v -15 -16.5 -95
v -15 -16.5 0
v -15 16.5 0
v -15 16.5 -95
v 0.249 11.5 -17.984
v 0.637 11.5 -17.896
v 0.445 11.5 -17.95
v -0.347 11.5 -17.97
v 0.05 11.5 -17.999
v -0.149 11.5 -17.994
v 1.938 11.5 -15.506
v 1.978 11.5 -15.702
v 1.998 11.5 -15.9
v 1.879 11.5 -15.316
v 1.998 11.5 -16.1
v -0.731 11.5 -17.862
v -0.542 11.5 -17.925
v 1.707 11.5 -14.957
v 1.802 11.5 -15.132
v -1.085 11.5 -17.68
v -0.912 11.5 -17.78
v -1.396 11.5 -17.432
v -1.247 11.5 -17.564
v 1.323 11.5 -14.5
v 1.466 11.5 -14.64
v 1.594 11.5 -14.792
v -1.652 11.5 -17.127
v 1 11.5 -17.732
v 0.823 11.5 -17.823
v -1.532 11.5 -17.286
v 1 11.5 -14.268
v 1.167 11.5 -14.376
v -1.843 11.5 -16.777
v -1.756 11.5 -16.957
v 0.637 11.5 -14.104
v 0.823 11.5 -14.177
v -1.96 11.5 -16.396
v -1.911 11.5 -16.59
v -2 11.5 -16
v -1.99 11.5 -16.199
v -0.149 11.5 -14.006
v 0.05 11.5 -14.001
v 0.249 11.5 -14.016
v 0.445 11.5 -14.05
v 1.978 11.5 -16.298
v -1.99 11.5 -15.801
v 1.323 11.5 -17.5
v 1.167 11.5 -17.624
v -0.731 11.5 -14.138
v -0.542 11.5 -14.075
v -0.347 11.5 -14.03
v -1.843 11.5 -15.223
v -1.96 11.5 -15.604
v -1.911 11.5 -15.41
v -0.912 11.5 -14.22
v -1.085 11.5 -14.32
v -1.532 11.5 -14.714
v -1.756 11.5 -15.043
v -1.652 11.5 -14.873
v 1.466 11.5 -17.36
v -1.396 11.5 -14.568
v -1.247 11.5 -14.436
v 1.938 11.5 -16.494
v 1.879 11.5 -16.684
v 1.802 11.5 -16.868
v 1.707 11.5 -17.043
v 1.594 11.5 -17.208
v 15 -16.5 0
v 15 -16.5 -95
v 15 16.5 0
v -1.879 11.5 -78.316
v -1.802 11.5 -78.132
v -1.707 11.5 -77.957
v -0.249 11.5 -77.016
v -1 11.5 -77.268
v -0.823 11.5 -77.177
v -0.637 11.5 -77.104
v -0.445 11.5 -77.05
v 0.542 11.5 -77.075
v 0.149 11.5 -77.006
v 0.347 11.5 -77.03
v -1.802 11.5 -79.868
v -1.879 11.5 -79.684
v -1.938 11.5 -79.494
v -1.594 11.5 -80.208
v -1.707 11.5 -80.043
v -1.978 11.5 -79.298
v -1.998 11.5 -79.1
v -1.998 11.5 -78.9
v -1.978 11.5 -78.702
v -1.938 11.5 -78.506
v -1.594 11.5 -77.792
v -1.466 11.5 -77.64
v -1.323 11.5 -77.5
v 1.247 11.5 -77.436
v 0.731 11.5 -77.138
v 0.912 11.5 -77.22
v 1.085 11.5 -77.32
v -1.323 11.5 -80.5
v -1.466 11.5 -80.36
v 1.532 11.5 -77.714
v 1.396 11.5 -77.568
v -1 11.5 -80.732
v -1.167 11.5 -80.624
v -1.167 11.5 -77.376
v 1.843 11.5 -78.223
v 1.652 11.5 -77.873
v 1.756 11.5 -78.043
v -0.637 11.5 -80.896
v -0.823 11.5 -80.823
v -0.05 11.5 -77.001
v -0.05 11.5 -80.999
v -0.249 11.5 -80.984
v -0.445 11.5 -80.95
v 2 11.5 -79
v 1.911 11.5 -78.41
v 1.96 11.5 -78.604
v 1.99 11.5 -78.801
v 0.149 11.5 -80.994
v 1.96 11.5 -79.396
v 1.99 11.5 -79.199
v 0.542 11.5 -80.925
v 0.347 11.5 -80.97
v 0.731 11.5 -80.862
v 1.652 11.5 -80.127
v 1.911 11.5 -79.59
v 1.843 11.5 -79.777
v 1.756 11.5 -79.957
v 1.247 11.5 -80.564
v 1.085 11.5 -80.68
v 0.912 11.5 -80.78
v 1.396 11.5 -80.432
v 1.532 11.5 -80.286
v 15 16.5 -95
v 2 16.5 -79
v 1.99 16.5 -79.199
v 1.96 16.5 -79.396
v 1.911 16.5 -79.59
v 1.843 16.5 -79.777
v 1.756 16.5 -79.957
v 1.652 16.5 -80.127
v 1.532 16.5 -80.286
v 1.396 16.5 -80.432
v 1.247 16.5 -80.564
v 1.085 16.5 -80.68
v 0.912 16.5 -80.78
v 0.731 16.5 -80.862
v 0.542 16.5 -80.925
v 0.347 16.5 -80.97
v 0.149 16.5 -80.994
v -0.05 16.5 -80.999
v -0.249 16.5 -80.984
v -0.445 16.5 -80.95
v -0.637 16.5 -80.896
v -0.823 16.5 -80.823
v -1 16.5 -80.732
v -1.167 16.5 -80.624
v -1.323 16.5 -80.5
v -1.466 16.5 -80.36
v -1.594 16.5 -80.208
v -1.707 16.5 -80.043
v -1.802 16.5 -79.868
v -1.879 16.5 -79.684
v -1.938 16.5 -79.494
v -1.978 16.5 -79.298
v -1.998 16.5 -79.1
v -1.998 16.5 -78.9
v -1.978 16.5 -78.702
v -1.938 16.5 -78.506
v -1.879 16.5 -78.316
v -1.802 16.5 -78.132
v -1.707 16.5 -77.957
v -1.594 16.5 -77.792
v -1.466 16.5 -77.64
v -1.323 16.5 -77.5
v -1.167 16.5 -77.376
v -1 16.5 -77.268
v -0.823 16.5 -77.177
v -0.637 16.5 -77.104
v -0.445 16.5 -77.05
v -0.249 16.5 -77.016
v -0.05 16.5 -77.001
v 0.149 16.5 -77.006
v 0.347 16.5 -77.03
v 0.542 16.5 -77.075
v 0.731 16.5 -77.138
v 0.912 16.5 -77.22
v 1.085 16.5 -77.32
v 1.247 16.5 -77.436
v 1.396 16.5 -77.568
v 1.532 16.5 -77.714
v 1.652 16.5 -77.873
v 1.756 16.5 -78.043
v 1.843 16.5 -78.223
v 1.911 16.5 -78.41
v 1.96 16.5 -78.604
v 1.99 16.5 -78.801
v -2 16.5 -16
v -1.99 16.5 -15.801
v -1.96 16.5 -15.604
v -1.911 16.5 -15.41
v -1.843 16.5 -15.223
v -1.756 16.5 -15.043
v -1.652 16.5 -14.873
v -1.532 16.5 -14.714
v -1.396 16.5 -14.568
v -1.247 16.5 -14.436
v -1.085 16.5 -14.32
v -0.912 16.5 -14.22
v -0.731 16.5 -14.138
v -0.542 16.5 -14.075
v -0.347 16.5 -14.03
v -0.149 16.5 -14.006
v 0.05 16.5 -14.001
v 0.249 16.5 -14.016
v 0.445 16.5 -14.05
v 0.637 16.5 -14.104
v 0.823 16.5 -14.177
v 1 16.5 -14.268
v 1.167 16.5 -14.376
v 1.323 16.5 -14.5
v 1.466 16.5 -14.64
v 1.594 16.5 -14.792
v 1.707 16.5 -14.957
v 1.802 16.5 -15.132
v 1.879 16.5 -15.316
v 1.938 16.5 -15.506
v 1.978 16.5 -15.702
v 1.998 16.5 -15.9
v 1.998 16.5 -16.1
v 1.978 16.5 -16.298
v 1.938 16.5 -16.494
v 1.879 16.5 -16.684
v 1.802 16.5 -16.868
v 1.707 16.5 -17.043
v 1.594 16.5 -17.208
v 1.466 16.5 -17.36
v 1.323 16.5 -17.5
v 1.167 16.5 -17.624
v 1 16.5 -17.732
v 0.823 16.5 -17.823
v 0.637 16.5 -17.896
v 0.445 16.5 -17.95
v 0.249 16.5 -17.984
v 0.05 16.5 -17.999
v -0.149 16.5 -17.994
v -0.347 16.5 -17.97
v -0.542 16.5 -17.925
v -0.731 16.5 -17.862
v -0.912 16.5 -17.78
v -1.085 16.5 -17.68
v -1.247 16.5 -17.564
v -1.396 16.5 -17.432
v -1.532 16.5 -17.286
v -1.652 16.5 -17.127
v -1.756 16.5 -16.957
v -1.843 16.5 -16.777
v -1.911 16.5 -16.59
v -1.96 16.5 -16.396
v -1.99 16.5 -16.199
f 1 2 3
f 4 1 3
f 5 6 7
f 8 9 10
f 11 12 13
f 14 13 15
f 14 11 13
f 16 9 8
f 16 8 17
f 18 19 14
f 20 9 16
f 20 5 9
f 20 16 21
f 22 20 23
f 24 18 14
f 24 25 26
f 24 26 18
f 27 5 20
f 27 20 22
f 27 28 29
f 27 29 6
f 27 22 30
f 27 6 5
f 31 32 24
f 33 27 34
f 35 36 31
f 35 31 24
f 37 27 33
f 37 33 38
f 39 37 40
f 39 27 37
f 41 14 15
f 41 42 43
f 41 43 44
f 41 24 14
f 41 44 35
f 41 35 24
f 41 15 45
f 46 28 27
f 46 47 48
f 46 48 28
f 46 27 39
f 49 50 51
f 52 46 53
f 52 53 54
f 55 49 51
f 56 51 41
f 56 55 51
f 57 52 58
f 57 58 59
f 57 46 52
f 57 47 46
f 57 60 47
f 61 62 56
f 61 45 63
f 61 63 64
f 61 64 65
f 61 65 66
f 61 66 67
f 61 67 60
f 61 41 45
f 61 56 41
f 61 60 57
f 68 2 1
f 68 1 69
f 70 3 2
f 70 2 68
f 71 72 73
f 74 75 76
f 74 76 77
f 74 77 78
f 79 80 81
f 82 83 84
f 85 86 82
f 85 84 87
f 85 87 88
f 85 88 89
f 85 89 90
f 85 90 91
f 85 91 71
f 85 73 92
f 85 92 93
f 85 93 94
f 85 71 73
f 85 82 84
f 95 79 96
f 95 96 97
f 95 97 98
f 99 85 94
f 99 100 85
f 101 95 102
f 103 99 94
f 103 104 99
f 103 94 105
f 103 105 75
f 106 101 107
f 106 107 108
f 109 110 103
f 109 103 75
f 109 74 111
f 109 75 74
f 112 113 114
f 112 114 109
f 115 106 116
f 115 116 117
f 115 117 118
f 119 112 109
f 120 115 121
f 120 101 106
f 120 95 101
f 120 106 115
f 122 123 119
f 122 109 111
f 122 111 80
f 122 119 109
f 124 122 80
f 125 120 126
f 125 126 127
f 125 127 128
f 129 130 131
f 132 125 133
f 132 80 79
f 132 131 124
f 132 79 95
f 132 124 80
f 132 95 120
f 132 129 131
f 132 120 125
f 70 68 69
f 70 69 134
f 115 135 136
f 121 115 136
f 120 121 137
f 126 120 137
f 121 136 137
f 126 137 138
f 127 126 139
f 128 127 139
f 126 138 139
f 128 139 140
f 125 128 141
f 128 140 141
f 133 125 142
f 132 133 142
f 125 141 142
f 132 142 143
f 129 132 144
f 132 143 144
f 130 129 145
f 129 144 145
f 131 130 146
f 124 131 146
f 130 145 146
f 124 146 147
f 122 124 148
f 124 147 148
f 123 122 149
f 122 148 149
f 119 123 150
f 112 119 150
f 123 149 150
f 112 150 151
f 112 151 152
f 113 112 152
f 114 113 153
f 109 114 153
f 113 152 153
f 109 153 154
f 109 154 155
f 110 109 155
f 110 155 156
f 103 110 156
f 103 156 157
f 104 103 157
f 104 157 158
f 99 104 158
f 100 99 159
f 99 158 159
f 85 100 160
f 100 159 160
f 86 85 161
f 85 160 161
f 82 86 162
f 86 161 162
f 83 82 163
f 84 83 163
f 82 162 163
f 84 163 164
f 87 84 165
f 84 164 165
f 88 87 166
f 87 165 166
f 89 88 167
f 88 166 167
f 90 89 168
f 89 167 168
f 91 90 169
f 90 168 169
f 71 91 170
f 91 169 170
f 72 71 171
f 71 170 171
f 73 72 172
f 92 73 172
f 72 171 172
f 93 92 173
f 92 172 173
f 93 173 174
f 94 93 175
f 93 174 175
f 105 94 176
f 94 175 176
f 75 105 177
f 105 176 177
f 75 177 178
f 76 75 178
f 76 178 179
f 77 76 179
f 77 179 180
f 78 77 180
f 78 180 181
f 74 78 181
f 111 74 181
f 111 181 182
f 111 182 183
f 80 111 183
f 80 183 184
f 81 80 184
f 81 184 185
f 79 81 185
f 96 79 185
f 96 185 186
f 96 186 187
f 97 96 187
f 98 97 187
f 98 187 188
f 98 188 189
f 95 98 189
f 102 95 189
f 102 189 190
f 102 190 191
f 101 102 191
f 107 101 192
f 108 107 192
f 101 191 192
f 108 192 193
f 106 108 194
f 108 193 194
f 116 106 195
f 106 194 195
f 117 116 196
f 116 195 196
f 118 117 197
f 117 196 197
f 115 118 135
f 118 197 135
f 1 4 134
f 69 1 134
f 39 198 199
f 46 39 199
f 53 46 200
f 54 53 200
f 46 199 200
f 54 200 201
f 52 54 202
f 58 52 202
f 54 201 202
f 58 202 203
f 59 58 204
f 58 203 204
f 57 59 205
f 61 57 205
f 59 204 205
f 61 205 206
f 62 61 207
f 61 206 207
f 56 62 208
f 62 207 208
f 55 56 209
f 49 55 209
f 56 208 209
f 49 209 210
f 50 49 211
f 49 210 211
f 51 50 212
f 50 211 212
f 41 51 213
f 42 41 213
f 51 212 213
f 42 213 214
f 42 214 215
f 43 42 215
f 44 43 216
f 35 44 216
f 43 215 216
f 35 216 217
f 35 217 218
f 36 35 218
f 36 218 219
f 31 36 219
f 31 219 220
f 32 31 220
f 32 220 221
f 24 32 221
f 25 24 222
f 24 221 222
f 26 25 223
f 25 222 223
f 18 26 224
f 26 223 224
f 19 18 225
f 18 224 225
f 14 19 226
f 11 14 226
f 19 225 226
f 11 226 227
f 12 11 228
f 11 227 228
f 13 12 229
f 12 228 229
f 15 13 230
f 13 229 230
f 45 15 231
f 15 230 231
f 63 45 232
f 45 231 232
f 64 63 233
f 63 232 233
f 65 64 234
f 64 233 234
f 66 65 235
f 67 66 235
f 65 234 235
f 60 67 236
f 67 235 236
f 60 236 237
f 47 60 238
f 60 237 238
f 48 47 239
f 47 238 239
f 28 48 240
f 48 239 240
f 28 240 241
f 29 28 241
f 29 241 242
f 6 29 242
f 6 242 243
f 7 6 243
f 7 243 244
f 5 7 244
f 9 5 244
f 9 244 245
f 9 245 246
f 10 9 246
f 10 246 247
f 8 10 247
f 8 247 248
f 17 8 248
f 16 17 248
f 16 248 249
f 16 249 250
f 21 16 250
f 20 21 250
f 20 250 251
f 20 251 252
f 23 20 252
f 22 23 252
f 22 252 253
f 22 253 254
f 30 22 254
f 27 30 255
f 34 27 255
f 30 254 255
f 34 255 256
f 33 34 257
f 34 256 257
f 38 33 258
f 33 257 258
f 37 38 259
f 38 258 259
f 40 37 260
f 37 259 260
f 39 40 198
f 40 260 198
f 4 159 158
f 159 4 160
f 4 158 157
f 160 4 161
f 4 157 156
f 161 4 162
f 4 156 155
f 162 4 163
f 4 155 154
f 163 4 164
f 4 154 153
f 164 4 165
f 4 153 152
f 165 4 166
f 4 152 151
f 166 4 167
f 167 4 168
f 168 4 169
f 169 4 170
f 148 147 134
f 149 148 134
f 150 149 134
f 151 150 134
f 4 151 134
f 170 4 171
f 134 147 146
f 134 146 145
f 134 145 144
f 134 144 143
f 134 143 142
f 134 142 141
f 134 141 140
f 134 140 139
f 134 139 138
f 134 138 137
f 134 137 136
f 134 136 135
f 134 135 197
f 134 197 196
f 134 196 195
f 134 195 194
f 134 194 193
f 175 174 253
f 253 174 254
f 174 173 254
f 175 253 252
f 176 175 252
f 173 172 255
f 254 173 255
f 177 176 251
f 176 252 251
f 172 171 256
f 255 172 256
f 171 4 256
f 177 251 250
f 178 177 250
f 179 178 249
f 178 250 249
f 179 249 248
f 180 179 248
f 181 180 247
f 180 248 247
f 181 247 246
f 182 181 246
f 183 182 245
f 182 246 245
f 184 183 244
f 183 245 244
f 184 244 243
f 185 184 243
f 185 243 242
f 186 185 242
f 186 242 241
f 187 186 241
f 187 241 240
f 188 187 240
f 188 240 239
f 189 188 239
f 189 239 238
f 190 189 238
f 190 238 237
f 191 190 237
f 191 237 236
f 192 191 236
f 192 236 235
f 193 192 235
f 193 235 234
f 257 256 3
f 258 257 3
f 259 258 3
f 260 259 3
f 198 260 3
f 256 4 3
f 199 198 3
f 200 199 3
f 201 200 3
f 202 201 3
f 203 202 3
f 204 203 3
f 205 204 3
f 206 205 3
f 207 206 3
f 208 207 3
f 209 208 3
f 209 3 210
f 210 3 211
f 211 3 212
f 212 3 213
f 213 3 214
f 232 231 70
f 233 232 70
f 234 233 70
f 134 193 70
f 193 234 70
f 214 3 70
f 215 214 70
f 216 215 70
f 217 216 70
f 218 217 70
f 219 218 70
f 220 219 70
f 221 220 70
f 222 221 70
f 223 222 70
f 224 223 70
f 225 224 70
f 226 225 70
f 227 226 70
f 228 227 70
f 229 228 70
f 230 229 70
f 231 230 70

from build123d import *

# Parameters (mm, degrees)
CROQUIS1_W              = 30
CROQUIS1_H              = 33
SALIENTE_EXTRUIR1_DEPTH = 95
CROQUIS2_R              = 2
CORTAR_EXTRUIR1_DEPTH   = 5


with BuildPart() as part:
    # Croquis1 → Saliente-Extruir1 (new body)
    with BuildSketch(Plane.XY):
        Rectangle(CROQUIS1_W, CROQUIS1_H)
    extrude(amount=-SALIENTE_EXTRUIR1_DEPTH)

    # Croquis2 → Cortar-Extruir1 (cut)
    with BuildSketch(Plane(origin=(0, 16.5, 0), x_dir=(1, 0, 0), z_dir=(0, 1, 0))):
        with Locations(Location((0, 16, 0), (0, 0, 180))):
            Circle(CROQUIS2_R)
        with Locations((0, 79)):
            Circle(CROQUIS2_R)
    extrude(amount=-CORTAR_EXTRUIR1_DEPTH, mode=Mode.SUBTRACT)


solid = part.part
